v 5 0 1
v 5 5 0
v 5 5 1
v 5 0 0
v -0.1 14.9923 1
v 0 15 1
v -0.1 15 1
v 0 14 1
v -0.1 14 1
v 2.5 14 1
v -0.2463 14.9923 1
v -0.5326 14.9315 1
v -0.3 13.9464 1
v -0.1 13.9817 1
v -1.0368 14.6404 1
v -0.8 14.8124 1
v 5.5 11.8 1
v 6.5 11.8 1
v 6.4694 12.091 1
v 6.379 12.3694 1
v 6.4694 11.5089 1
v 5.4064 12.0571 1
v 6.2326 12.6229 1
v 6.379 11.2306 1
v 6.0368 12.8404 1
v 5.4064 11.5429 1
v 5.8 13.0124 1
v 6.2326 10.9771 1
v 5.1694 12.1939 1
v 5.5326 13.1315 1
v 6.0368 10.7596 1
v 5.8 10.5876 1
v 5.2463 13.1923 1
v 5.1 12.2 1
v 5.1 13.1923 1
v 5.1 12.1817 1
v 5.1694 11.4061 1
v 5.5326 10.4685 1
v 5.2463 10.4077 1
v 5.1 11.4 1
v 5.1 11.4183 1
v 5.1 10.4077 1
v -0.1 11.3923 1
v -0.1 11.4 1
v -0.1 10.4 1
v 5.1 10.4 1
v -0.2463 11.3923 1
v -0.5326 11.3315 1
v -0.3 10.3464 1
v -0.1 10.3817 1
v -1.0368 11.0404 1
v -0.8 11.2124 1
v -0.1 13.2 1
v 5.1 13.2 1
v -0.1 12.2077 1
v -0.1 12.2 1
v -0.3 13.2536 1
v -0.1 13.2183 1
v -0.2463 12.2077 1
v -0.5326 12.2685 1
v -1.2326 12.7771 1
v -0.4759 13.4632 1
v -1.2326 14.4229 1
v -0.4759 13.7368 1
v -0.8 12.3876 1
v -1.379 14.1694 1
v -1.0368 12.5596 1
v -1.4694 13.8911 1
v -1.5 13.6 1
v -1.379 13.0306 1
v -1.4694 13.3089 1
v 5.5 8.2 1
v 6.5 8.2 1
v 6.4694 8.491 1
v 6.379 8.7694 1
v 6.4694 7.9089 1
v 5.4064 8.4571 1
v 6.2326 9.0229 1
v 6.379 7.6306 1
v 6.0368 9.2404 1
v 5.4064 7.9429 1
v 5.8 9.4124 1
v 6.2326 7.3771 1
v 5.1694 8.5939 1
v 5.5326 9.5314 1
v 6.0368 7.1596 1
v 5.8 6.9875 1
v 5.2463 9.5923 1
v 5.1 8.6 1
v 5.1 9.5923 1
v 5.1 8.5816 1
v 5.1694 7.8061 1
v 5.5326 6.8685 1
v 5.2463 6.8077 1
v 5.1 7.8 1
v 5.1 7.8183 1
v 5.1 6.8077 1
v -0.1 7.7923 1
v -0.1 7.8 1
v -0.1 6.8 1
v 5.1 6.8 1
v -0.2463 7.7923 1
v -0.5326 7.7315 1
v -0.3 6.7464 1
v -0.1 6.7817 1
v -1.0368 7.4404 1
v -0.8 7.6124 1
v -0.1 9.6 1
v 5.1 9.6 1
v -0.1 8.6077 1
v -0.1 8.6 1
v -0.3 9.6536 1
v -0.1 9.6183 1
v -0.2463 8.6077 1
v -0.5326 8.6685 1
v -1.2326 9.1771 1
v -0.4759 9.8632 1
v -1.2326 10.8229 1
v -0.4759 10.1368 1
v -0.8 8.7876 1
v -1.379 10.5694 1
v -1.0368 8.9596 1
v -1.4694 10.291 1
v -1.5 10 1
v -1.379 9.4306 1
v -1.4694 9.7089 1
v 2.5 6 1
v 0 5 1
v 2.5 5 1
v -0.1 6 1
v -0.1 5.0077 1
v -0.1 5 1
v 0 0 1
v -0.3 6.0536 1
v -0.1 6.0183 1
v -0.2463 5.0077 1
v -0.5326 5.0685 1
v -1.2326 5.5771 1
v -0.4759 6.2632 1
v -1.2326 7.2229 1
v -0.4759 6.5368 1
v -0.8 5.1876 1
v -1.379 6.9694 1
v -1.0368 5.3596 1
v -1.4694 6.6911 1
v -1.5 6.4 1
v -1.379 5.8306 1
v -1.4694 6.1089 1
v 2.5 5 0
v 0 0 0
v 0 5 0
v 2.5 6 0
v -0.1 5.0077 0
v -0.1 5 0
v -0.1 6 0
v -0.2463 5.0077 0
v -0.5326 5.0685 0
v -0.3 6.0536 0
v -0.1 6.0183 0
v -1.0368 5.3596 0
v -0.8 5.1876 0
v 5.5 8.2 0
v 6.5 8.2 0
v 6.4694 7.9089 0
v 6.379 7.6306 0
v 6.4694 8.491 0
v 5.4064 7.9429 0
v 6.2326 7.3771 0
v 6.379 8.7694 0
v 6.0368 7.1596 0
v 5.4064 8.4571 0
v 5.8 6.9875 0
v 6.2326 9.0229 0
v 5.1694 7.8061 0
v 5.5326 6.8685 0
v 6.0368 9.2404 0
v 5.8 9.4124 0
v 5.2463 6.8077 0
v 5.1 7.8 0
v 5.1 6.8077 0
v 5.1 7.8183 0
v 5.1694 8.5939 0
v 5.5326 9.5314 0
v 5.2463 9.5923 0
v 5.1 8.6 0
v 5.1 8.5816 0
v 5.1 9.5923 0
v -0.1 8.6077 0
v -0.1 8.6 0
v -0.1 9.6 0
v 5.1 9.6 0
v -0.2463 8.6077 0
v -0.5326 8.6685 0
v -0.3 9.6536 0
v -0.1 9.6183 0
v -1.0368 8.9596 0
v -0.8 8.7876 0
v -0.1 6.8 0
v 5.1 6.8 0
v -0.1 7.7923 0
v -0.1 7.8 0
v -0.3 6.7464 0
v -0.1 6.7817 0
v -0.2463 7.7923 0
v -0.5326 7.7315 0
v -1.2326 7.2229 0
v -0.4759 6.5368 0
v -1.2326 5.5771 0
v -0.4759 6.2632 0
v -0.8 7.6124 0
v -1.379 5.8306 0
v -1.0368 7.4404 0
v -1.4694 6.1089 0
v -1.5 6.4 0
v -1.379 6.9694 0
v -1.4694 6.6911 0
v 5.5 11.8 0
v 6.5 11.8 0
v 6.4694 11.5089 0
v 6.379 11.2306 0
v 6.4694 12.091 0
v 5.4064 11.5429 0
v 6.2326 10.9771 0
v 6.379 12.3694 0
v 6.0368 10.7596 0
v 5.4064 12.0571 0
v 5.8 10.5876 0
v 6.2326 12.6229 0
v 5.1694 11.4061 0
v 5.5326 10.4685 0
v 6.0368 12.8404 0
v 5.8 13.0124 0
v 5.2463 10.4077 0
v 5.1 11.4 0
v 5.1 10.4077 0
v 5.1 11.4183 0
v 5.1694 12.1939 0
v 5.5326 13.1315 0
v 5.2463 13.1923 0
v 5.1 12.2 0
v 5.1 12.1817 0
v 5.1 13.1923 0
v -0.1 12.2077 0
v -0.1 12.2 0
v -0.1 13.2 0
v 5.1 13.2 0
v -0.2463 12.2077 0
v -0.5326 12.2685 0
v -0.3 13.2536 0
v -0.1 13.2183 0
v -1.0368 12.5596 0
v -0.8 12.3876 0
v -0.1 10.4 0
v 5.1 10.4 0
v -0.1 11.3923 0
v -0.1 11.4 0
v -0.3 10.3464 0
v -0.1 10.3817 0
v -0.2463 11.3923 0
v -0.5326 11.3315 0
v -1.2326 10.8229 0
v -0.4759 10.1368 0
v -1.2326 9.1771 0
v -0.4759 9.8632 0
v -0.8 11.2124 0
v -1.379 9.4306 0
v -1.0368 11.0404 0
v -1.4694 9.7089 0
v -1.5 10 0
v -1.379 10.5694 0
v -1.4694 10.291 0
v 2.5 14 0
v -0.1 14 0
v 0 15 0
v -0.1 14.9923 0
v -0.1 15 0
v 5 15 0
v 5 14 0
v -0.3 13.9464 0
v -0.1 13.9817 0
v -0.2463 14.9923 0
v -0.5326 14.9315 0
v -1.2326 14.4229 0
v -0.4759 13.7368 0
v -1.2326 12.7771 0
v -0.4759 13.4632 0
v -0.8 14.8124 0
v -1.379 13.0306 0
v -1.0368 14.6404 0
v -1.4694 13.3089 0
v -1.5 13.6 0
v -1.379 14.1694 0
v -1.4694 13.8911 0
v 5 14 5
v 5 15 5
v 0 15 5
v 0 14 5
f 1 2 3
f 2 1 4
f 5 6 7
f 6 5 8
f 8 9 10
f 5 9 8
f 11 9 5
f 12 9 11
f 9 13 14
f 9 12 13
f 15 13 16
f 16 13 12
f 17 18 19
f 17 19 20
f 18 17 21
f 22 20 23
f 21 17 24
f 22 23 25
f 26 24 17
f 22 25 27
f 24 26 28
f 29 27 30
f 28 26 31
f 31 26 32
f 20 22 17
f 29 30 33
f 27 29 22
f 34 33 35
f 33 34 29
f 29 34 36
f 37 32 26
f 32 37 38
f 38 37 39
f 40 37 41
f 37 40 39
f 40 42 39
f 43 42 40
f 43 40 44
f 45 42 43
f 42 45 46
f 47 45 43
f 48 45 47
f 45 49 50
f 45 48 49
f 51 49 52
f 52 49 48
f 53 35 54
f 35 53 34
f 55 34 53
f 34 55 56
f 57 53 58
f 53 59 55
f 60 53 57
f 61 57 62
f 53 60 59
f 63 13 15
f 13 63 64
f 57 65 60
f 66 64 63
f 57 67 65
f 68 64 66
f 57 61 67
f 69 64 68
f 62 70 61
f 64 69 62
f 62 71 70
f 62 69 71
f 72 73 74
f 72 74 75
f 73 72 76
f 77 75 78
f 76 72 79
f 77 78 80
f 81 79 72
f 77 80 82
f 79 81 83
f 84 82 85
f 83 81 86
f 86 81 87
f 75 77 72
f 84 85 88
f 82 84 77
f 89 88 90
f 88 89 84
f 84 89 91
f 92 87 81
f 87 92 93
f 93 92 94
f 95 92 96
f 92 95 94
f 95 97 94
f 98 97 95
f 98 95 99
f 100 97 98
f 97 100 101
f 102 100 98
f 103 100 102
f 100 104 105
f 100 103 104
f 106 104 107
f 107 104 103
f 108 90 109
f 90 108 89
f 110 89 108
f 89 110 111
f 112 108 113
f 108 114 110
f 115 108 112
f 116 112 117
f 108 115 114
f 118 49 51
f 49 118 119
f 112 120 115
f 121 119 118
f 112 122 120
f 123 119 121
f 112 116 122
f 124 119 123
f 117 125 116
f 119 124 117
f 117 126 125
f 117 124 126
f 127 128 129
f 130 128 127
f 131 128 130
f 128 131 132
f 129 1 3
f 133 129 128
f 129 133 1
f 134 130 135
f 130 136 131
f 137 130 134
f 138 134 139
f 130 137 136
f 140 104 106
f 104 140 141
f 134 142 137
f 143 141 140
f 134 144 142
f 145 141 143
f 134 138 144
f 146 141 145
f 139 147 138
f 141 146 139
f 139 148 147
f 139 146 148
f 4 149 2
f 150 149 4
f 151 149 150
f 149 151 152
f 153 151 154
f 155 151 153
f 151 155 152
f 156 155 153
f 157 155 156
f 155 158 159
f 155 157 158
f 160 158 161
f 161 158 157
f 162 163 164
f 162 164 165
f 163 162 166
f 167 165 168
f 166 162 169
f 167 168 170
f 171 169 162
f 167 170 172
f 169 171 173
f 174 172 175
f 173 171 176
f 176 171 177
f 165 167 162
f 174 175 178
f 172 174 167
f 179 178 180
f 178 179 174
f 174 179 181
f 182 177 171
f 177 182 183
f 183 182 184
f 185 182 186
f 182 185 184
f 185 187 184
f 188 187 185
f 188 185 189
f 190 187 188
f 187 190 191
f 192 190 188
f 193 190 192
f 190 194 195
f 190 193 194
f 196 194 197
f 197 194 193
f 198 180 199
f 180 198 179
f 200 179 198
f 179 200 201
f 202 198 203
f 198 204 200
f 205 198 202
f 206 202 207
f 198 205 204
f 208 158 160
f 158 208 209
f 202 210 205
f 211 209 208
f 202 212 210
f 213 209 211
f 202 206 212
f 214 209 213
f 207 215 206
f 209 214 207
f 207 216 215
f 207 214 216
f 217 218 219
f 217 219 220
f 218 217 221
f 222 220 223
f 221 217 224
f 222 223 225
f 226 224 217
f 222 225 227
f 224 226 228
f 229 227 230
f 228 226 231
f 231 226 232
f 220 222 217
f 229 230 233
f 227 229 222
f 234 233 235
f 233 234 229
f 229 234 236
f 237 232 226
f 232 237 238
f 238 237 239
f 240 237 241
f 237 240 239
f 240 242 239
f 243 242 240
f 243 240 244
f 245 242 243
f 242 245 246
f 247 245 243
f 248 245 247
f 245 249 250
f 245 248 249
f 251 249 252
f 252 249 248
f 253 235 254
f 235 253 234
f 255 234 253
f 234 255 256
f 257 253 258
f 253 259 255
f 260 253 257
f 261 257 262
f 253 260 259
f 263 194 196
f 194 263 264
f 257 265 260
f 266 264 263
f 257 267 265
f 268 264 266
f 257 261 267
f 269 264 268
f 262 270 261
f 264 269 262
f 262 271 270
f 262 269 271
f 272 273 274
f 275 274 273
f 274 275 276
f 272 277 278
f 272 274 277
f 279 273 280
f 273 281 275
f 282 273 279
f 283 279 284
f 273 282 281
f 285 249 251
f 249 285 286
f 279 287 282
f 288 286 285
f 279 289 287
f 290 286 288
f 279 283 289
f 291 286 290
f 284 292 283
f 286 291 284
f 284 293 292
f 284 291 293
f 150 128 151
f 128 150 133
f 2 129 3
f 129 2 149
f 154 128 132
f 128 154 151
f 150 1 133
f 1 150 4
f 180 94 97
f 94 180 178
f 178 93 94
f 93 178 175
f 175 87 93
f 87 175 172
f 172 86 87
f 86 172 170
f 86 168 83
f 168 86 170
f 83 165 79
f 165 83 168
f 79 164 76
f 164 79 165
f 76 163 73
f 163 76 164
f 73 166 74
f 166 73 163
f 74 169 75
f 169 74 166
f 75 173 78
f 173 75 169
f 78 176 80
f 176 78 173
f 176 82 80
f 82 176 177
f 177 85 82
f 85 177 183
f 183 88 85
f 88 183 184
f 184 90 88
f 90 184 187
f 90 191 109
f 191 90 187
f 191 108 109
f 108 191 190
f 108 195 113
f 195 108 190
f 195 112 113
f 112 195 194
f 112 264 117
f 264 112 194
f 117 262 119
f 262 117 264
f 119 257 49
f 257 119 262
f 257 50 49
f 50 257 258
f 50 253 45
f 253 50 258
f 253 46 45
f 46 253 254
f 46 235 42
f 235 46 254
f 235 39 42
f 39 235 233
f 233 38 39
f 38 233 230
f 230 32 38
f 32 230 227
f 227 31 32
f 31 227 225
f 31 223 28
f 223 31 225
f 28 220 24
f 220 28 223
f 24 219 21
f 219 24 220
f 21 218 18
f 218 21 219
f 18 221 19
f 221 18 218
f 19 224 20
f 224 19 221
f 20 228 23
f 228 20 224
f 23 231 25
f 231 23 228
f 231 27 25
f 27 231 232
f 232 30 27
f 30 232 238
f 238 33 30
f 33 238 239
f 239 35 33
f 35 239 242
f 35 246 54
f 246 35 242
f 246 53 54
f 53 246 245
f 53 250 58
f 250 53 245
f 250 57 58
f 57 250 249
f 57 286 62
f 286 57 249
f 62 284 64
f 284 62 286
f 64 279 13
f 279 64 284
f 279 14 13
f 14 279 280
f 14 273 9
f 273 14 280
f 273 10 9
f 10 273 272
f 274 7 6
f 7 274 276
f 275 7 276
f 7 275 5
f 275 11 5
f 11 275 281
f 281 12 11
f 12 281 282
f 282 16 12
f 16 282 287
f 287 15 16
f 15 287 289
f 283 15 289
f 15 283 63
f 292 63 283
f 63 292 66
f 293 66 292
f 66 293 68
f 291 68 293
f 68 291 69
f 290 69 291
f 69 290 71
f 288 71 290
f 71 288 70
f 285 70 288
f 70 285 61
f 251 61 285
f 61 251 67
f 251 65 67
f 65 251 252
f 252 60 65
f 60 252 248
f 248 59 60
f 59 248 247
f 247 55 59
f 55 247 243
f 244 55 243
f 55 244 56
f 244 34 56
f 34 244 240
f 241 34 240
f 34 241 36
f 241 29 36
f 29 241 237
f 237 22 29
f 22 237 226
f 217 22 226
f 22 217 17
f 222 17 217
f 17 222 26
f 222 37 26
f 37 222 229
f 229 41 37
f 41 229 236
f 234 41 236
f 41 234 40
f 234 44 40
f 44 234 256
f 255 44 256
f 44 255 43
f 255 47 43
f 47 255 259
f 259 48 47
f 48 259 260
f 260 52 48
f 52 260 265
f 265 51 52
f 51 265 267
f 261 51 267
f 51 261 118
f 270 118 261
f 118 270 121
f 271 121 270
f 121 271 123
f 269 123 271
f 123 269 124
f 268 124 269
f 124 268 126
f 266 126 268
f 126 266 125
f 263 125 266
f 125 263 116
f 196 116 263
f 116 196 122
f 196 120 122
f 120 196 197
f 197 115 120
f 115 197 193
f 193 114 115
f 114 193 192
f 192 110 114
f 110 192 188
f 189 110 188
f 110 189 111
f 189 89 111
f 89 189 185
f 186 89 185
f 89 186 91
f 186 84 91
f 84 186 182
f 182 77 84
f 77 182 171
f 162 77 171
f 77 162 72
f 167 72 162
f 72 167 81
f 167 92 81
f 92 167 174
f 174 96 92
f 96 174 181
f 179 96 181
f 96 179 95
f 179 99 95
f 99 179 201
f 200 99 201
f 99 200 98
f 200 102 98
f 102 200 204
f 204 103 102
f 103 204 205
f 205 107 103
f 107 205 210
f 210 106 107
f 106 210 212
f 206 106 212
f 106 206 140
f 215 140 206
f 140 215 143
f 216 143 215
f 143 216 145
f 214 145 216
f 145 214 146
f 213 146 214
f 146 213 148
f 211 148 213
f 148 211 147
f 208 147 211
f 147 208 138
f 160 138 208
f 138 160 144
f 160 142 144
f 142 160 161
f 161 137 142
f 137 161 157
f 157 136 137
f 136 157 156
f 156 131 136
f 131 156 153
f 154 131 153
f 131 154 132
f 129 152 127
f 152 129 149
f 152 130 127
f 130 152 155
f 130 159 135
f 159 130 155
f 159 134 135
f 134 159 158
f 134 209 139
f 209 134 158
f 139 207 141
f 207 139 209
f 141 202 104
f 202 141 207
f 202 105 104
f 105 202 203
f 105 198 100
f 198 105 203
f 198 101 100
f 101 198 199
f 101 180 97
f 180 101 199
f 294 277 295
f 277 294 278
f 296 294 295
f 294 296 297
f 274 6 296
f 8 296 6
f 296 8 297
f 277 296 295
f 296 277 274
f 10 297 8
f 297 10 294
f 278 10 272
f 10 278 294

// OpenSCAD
$fs = 0.3;

module ringSet(spacing, thickness) {
	translate([0, spacing/2 + thickness])
	
	difference() {
		circle(r = spacing/2 + thickness);
		circle(r = spacing/2);
	}
}

module ringCut(spacing, width, thickness, side) {
	intersection() {
		if(side == "left") {
			translate([- spacing/2 - thickness, 0])
			square([spacing/2 + thickness, spacing + thickness*2]);
		}
		else {
			square([spacing/2 + thickness, spacing + thickness*2]);
		}
	
		ringSet(spacing, thickness);
	}
}

module chainBeams(spacing, width, thickness) {
	square([width/2 - spacing/2 - thickness, thickness]);
	
	translate([0, thickness + spacing])
	square([width/2 - spacing/2 - thickness, thickness]);
}

module chainElement(spacing, width, thickness, side) {
	trXBy = (side != "left") ? (width/2 - (spacing/2 + thickness)) : - (width/2 - (spacing/2 + thickness));
	
	translate([trXBy, 0]) ringCut(spacing, width, thickness, side);
	
	if(side != "left") {
		chainBeams(spacing, width, thickness);
	}
	else {
		translate([- (width/2 - spacing/2 - thickness), 0]) chainBeams(spacing, width, thickness);
	}
}

module chains(spacing, width, thickness, num) {
	trPerNum = spacing + thickness;
	for(i = [0:num-1]) {
		translate([0, trPerNum * i])
		chainElement(spacing, width, thickness, (i%2 == 0) ? "left" : "right");
	}
}

module chain(spacing, width, thickness, height, length) {
	linear_extrude(height)
	chains(spacing - thickness, width, thickness, length / spacing);
}

cube([5, 5, 1]);

translate([2.5, 5, 0])
chain(1.8, 8, 1, 1, 10);

translate([0, 14, 0])
cube([5, 1, 5]);
